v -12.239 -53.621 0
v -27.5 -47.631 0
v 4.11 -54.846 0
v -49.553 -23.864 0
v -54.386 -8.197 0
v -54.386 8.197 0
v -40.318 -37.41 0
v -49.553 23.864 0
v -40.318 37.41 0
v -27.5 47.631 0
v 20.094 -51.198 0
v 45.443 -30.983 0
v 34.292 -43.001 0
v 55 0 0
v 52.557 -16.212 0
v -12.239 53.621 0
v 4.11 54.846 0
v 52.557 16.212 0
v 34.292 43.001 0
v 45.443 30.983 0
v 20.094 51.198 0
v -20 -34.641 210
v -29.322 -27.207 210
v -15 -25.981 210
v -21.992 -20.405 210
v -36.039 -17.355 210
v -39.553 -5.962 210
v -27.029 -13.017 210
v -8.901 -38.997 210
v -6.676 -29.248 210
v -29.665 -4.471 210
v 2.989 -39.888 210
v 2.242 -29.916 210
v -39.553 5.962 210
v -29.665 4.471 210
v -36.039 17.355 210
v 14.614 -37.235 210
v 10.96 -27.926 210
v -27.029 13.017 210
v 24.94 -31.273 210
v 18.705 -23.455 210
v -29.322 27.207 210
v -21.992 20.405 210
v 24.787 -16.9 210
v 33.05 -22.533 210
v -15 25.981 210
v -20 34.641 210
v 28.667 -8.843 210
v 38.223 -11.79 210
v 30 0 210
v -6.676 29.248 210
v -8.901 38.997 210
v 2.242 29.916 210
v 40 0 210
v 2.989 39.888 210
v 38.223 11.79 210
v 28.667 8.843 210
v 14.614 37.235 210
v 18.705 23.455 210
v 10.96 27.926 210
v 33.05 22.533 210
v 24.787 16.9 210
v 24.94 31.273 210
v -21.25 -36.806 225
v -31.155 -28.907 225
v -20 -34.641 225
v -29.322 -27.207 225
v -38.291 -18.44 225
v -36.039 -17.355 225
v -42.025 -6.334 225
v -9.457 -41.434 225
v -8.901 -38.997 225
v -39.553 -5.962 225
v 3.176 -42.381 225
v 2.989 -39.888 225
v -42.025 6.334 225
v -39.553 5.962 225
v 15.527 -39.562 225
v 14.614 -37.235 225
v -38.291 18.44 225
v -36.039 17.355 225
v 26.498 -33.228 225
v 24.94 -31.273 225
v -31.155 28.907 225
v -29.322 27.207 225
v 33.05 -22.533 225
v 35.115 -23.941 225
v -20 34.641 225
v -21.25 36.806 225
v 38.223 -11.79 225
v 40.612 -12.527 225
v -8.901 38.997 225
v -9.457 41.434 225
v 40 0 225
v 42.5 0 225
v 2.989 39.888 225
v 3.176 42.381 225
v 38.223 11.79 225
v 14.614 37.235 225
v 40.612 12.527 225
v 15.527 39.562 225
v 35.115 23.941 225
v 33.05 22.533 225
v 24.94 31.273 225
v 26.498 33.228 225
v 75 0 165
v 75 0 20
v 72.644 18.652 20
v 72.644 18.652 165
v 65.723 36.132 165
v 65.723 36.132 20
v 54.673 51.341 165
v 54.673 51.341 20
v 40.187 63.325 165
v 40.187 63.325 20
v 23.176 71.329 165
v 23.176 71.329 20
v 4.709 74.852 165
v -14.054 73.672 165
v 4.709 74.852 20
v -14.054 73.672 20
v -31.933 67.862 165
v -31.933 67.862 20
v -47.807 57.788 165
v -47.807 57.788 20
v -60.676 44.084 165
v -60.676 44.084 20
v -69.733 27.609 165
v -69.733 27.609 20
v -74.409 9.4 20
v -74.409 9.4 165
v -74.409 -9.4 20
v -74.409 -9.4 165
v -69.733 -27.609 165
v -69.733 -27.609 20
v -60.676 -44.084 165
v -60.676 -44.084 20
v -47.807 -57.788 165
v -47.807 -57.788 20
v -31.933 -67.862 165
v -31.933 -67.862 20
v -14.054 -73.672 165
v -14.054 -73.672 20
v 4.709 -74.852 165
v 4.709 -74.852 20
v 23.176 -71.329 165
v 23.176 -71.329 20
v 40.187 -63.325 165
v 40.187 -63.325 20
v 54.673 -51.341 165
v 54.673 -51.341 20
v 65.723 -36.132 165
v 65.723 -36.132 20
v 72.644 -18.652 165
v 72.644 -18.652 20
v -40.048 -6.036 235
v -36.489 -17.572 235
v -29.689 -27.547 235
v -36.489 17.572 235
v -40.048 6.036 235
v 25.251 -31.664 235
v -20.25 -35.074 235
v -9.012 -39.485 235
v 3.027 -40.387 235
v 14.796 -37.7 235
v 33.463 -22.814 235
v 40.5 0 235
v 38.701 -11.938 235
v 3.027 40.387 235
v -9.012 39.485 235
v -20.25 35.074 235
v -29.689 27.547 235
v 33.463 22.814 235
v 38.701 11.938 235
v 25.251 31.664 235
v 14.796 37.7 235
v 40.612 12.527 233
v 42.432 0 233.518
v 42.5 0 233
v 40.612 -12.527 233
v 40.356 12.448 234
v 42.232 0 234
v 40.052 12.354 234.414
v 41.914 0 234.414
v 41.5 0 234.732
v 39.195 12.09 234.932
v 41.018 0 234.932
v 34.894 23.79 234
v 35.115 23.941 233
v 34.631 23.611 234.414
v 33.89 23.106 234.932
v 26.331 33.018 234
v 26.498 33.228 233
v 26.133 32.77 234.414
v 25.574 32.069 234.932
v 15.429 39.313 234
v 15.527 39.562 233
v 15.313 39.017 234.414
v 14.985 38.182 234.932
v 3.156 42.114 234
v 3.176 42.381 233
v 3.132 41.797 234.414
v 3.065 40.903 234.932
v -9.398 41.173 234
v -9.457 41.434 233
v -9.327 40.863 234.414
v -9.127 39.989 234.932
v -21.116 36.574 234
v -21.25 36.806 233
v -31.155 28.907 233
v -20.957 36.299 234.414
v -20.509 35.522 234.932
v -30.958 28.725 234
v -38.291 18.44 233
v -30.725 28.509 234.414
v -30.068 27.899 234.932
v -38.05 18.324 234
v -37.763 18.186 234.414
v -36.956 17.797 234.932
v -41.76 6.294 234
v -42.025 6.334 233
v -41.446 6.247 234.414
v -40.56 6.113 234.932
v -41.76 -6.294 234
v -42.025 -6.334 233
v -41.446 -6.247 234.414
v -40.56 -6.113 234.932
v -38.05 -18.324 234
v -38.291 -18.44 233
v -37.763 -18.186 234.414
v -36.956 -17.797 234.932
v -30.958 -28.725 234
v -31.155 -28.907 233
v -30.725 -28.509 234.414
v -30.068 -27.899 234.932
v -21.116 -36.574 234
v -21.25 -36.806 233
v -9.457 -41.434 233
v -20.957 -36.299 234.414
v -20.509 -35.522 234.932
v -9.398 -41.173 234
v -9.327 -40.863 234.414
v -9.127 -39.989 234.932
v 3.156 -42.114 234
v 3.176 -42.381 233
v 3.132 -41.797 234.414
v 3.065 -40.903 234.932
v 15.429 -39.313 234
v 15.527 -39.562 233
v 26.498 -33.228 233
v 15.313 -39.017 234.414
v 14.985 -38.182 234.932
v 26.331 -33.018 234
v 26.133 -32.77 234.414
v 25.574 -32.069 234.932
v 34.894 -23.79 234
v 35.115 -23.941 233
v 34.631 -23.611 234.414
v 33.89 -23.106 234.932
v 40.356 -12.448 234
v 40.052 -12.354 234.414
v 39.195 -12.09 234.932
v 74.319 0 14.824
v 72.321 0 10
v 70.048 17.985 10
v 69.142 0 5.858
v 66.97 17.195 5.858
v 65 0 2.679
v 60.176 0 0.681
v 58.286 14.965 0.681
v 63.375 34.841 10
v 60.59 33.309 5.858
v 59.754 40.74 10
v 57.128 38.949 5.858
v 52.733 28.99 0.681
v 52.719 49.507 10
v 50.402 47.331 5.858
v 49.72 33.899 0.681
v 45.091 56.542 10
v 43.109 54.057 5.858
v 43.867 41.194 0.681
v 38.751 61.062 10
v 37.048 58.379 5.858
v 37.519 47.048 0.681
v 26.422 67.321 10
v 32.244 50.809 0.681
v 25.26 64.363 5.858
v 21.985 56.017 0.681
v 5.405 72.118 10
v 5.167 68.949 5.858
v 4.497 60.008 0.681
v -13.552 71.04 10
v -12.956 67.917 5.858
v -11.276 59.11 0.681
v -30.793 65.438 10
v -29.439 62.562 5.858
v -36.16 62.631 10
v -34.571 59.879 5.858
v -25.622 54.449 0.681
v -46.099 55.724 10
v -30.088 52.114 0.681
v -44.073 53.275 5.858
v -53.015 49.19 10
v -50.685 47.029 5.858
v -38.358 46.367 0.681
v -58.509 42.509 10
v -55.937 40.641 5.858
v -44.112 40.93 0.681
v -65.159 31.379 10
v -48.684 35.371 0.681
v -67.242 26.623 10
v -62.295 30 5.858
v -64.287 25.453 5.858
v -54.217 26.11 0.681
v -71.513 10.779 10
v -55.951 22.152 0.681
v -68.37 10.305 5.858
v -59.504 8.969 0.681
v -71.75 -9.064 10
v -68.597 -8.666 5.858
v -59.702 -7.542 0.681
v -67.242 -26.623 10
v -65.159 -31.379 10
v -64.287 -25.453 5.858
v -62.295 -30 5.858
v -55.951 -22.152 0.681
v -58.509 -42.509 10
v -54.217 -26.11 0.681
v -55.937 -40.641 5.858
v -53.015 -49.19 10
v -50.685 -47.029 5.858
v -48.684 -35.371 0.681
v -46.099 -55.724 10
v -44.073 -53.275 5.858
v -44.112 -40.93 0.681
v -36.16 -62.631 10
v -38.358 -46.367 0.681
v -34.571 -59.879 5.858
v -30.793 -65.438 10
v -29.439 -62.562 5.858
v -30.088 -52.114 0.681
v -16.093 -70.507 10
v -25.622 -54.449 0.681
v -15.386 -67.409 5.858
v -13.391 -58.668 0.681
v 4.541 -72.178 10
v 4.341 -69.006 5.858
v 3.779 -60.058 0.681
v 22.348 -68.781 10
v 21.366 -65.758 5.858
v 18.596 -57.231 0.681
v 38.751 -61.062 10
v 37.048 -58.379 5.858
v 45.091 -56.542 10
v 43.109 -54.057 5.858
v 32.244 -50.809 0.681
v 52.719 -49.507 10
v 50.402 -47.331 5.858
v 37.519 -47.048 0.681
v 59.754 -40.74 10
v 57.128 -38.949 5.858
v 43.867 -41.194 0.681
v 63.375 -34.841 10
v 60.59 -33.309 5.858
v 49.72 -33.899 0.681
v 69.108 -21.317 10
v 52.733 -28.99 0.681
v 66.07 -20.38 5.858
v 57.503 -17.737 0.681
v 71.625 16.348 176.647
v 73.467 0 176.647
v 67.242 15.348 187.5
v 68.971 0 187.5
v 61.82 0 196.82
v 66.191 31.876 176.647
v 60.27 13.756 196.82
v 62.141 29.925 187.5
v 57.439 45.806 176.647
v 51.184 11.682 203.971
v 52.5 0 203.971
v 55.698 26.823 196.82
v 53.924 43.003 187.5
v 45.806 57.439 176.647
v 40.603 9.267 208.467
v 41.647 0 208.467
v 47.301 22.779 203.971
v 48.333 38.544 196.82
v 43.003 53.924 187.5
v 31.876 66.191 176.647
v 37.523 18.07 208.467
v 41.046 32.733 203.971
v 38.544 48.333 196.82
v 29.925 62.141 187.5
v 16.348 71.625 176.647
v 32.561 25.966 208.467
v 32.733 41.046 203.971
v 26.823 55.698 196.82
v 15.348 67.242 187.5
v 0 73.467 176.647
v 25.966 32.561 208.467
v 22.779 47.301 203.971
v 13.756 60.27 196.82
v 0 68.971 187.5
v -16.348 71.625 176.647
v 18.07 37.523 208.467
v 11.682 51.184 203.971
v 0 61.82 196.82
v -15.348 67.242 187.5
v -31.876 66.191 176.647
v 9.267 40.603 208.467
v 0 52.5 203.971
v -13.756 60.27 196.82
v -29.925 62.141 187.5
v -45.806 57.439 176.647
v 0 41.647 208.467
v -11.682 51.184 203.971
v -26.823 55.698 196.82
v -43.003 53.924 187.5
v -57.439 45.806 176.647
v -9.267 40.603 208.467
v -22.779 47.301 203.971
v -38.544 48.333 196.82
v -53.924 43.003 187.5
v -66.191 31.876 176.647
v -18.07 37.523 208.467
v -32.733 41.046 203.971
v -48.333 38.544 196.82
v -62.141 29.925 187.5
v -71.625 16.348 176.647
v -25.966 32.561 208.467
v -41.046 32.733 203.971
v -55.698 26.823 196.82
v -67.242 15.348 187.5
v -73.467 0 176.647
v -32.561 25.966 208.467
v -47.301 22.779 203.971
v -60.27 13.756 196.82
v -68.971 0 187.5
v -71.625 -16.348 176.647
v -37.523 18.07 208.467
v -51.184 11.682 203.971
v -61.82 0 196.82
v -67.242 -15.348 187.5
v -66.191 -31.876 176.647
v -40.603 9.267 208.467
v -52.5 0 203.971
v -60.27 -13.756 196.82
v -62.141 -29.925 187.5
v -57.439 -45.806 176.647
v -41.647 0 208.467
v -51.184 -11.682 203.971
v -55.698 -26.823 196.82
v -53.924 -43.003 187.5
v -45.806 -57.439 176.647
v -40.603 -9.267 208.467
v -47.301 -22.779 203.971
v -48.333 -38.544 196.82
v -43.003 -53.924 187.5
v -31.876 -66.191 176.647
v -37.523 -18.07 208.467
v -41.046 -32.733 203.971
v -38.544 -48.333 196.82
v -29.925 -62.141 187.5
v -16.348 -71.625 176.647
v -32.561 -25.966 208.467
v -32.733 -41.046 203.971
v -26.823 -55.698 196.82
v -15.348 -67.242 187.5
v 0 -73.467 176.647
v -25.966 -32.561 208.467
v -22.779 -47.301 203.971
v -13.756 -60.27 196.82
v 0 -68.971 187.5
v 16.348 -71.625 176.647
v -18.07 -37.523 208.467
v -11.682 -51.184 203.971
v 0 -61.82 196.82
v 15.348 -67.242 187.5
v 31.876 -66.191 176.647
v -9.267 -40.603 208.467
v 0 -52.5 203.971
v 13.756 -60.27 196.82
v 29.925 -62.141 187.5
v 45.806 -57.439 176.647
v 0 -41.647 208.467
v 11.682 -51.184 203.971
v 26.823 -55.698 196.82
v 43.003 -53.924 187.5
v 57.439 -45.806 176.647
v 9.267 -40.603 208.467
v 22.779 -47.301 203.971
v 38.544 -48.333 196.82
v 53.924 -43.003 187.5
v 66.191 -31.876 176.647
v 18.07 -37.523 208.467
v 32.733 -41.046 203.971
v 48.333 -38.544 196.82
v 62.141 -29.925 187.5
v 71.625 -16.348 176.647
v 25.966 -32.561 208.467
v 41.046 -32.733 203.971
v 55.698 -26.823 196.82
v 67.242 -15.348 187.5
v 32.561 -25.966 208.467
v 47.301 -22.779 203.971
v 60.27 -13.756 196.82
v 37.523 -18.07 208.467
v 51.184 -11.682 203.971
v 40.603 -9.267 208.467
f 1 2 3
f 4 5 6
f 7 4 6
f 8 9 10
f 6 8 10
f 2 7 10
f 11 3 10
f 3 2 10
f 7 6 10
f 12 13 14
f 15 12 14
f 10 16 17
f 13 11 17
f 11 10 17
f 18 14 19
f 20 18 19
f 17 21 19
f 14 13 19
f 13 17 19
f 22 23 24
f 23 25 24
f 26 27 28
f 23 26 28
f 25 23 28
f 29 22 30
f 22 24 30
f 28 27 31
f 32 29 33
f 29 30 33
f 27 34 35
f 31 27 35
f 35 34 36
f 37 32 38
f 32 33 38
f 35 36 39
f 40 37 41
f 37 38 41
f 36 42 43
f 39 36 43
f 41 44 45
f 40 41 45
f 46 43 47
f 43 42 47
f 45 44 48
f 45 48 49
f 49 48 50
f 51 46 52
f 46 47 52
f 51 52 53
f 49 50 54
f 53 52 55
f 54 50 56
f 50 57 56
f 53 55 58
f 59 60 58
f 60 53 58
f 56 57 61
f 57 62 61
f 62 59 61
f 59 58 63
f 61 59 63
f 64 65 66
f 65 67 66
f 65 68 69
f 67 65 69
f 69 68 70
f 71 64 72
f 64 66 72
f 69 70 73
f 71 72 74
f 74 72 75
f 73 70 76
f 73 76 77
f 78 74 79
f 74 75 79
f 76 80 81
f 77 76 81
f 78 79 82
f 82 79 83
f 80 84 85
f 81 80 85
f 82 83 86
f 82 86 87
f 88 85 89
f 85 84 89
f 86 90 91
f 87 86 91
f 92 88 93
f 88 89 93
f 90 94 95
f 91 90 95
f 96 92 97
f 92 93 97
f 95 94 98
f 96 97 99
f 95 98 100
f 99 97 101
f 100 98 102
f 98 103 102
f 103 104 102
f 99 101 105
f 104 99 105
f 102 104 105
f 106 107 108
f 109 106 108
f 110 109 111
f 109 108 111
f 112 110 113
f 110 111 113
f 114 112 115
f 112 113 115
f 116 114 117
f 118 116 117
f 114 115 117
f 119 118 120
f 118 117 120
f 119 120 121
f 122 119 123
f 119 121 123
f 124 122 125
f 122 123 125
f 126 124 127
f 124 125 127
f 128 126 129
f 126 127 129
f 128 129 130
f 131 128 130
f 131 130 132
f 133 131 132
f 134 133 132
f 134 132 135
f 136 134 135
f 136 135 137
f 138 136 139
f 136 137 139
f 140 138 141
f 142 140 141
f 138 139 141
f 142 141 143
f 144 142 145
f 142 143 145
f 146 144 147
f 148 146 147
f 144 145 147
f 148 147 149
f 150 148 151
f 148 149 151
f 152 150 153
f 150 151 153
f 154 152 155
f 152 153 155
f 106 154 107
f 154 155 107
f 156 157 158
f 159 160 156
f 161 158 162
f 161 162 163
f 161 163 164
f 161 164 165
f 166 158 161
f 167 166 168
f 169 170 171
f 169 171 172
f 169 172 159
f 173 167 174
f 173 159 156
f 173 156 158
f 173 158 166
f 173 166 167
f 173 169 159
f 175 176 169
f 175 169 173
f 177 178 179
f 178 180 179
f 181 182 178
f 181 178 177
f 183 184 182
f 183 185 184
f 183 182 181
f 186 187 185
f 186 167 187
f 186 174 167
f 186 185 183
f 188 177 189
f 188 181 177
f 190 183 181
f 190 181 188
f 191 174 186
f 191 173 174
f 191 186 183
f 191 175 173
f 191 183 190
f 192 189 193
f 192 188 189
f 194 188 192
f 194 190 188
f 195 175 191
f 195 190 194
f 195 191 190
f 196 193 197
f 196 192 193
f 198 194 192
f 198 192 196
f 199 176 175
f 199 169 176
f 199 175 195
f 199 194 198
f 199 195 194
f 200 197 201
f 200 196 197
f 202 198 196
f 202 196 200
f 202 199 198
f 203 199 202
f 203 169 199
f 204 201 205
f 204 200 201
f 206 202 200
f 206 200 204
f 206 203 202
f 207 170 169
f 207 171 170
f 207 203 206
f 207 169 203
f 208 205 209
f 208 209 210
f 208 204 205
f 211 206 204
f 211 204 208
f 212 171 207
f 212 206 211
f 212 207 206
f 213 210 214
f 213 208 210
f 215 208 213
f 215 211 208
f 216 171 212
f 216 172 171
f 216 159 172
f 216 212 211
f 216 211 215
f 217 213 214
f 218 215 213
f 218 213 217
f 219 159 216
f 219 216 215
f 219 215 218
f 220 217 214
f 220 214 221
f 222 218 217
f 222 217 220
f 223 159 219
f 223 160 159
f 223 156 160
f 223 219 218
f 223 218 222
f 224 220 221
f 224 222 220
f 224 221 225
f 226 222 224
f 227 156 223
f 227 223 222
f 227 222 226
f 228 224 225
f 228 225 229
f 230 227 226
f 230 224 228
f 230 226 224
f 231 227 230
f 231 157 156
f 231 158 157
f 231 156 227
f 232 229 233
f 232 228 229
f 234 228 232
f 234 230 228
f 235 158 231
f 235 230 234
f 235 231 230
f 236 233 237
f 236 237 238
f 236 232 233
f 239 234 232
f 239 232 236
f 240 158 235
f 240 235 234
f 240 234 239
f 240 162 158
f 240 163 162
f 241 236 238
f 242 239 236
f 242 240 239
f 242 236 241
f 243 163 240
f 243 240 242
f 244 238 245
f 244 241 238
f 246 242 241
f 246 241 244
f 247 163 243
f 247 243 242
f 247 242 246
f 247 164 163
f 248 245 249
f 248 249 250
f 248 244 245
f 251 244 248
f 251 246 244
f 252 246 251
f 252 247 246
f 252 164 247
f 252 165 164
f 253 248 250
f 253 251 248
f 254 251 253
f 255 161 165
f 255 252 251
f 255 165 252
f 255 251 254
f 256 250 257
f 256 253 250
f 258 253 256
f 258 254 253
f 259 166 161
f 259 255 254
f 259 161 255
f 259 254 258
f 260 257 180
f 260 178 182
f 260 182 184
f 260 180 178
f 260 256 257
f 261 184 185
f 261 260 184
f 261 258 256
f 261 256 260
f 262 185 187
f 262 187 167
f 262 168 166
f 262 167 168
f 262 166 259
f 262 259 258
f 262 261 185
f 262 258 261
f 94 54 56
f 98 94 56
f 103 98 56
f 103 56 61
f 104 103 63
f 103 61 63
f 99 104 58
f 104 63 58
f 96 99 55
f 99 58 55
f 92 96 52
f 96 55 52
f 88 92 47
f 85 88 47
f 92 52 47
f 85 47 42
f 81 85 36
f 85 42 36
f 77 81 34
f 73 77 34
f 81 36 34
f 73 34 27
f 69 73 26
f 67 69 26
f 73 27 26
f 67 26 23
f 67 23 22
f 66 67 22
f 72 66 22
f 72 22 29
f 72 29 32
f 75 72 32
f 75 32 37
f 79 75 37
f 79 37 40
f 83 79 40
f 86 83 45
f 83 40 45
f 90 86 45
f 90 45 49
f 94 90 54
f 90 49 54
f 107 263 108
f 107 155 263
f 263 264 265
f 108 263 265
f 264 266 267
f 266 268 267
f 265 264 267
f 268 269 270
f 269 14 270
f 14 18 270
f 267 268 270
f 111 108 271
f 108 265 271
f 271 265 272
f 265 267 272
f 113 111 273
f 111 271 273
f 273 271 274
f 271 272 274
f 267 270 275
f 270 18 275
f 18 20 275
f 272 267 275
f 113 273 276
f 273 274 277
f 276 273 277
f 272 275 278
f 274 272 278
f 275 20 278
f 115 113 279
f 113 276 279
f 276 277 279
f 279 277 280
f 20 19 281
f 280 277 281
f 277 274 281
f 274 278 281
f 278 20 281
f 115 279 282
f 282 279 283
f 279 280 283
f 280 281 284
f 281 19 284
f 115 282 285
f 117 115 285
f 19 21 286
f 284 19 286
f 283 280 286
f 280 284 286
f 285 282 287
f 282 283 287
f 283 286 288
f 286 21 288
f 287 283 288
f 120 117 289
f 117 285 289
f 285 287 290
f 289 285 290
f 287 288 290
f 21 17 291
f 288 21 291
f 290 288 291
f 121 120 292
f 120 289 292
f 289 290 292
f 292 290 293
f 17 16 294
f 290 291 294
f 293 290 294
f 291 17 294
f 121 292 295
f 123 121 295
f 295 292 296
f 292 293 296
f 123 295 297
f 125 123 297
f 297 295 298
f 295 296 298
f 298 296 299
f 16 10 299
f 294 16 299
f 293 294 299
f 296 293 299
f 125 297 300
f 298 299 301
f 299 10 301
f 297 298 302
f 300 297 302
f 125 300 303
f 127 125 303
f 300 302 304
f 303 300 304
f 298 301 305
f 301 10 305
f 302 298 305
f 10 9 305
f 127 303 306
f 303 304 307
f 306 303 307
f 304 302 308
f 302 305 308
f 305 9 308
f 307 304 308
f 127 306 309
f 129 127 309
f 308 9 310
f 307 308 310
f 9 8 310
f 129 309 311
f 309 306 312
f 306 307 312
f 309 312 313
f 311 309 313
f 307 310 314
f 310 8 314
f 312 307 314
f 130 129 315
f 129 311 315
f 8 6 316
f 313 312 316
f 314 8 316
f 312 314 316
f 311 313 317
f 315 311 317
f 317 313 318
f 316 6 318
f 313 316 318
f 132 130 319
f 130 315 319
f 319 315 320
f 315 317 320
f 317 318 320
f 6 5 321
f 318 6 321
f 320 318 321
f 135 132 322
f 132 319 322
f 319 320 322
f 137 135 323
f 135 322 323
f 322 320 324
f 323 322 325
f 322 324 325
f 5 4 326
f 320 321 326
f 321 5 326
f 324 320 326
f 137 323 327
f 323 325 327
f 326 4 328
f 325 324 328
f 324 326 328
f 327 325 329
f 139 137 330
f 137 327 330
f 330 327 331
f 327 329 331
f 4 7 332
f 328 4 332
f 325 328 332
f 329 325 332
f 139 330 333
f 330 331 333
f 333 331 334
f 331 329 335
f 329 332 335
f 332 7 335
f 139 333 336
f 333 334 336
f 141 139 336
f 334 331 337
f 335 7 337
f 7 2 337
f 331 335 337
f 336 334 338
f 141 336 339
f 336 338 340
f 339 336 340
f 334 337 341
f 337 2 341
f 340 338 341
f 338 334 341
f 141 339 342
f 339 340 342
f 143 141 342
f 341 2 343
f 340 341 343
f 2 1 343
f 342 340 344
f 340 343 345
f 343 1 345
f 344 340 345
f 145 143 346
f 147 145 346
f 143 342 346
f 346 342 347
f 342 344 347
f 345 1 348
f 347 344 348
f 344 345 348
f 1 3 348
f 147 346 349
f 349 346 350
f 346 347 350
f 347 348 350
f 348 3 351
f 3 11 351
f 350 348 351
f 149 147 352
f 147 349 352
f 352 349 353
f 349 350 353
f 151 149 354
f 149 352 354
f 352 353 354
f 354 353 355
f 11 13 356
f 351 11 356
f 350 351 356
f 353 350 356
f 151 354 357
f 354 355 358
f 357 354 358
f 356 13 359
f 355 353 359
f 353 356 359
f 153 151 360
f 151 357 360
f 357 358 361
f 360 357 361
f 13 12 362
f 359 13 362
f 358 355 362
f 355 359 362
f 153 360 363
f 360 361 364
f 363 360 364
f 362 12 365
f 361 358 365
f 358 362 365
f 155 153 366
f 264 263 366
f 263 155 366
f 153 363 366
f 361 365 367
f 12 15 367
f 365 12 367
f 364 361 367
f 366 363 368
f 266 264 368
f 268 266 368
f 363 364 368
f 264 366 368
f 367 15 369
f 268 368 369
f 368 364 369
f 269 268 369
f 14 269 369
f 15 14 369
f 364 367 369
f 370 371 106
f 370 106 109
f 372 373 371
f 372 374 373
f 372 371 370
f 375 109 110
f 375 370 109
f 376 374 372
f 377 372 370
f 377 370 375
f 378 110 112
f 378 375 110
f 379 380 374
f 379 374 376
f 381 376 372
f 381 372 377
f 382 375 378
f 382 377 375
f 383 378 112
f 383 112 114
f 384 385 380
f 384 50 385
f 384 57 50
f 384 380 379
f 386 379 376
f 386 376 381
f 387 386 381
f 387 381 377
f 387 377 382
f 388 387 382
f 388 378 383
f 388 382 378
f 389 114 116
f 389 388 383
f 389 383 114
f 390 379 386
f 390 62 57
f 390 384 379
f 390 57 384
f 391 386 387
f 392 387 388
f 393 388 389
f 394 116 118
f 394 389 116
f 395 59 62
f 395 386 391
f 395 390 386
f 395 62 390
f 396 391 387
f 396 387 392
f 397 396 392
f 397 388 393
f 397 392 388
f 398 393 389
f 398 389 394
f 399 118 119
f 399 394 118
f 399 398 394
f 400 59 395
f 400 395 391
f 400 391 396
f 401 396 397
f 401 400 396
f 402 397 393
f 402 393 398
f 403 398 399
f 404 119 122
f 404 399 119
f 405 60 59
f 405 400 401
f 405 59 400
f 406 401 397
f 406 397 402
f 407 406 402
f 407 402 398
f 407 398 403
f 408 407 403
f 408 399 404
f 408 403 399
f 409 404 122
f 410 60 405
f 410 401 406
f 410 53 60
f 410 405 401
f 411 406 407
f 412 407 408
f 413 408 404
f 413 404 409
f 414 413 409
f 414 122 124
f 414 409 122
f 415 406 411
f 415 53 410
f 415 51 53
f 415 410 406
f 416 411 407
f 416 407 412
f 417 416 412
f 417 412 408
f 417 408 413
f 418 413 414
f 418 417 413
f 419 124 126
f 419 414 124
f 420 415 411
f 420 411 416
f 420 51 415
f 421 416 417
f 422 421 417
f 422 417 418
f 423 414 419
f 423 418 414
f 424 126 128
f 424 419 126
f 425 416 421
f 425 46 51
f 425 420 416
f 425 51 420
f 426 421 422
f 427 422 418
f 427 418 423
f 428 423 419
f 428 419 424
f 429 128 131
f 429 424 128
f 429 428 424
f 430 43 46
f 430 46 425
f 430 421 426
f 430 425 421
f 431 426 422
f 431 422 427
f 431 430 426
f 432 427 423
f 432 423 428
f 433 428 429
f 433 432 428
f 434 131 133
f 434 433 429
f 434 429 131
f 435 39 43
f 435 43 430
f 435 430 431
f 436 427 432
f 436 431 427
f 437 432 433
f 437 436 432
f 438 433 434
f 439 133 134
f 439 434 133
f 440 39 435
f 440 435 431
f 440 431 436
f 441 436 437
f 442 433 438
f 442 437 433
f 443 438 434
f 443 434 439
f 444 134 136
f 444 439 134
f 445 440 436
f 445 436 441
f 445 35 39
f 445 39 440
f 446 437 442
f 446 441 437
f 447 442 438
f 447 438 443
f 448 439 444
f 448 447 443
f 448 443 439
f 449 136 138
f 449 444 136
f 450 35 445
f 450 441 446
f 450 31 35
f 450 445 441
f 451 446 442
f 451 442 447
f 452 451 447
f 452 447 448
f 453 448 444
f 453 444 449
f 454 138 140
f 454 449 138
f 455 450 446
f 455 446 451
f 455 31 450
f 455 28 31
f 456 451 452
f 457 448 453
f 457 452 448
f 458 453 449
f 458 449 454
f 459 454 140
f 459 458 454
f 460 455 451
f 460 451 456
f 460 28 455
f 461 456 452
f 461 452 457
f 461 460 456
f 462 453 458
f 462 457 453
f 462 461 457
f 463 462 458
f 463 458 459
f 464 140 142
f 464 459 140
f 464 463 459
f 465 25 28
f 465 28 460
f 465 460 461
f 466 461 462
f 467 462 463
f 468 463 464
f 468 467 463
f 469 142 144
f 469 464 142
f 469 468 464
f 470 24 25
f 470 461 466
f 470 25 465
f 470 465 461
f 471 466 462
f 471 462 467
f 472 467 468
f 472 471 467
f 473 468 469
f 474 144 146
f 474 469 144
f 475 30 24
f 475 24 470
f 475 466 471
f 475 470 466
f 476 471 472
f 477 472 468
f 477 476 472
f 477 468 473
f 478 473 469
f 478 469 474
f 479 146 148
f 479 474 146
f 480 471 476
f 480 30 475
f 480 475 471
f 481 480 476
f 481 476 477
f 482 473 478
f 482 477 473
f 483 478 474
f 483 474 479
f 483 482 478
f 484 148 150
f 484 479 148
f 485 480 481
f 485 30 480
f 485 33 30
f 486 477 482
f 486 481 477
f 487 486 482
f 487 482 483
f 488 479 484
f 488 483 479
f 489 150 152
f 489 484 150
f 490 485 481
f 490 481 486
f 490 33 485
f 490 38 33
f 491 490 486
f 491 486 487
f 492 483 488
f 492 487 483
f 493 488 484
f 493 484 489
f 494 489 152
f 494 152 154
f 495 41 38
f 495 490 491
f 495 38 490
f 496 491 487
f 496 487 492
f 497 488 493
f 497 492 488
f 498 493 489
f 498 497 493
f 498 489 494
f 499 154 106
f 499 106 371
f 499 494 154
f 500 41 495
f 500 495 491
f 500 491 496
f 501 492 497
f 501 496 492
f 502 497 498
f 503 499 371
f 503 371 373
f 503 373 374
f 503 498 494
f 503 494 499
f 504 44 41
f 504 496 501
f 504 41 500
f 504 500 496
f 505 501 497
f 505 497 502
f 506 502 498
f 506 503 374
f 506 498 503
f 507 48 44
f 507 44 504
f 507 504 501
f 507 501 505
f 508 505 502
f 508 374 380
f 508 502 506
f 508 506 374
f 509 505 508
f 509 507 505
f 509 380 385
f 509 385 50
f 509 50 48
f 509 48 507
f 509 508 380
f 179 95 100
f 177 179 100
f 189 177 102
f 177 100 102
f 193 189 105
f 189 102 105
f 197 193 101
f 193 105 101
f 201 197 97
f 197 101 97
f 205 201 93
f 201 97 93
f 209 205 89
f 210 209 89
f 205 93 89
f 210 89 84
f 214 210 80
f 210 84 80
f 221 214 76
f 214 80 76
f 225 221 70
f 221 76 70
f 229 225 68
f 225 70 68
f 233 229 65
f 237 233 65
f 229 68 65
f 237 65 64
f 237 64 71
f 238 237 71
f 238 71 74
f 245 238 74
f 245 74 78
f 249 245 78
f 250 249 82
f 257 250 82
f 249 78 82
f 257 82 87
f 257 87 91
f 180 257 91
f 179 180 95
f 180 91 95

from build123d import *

# Parameters (mm, degrees)
SKETCH_R     = 75
PAD_DEPTH    = 210
FILLET_R     = 45
FILLET001_R  = 20
SKETCH001_R  = 40
PAD001_DEPTH = 15
SKETCH002_R  = 42.5
PAD002_DEPTH = 10
FILLET002_R  = 2


with BuildPart() as part:
    # Sketch → Pad (new body)
    with BuildSketch(Plane.XY):
        Circle(SKETCH_R)
    extrude(amount=PAD_DEPTH)

    # Fillet
    fillet_edges = [part.edges().sort_by_distance(p)[0] for p in [
        (-75, 0, 210),
    ]]
    fillet(fillet_edges, radius=FILLET_R)

    # Fillet001
    fillet001_edges = [part.edges().sort_by_distance(p)[0] for p in [
        (-75, 0, 0),
    ]]
    fillet(fillet001_edges, radius=FILLET001_R)

    # Sketch001 (on Face5 of Fillet001) → Pad001 (join)
    with BuildSketch(Plane.XY.offset(210)):
        Circle(SKETCH001_R)
    extrude(amount=PAD001_DEPTH)

    # Sketch002 (on Face3 of Pad001) → Pad002 (join)
    with BuildSketch(Plane.XY.offset(225)):
        Circle(SKETCH002_R)
    extrude(amount=PAD002_DEPTH)

    # Fillet002
    fillet002_edges = [part.edges().sort_by_distance(p)[0] for p in [
        (-42.5, 0, 235),
    ]]
    fillet(fillet002_edges, radius=FILLET002_R)


solid = part.part
